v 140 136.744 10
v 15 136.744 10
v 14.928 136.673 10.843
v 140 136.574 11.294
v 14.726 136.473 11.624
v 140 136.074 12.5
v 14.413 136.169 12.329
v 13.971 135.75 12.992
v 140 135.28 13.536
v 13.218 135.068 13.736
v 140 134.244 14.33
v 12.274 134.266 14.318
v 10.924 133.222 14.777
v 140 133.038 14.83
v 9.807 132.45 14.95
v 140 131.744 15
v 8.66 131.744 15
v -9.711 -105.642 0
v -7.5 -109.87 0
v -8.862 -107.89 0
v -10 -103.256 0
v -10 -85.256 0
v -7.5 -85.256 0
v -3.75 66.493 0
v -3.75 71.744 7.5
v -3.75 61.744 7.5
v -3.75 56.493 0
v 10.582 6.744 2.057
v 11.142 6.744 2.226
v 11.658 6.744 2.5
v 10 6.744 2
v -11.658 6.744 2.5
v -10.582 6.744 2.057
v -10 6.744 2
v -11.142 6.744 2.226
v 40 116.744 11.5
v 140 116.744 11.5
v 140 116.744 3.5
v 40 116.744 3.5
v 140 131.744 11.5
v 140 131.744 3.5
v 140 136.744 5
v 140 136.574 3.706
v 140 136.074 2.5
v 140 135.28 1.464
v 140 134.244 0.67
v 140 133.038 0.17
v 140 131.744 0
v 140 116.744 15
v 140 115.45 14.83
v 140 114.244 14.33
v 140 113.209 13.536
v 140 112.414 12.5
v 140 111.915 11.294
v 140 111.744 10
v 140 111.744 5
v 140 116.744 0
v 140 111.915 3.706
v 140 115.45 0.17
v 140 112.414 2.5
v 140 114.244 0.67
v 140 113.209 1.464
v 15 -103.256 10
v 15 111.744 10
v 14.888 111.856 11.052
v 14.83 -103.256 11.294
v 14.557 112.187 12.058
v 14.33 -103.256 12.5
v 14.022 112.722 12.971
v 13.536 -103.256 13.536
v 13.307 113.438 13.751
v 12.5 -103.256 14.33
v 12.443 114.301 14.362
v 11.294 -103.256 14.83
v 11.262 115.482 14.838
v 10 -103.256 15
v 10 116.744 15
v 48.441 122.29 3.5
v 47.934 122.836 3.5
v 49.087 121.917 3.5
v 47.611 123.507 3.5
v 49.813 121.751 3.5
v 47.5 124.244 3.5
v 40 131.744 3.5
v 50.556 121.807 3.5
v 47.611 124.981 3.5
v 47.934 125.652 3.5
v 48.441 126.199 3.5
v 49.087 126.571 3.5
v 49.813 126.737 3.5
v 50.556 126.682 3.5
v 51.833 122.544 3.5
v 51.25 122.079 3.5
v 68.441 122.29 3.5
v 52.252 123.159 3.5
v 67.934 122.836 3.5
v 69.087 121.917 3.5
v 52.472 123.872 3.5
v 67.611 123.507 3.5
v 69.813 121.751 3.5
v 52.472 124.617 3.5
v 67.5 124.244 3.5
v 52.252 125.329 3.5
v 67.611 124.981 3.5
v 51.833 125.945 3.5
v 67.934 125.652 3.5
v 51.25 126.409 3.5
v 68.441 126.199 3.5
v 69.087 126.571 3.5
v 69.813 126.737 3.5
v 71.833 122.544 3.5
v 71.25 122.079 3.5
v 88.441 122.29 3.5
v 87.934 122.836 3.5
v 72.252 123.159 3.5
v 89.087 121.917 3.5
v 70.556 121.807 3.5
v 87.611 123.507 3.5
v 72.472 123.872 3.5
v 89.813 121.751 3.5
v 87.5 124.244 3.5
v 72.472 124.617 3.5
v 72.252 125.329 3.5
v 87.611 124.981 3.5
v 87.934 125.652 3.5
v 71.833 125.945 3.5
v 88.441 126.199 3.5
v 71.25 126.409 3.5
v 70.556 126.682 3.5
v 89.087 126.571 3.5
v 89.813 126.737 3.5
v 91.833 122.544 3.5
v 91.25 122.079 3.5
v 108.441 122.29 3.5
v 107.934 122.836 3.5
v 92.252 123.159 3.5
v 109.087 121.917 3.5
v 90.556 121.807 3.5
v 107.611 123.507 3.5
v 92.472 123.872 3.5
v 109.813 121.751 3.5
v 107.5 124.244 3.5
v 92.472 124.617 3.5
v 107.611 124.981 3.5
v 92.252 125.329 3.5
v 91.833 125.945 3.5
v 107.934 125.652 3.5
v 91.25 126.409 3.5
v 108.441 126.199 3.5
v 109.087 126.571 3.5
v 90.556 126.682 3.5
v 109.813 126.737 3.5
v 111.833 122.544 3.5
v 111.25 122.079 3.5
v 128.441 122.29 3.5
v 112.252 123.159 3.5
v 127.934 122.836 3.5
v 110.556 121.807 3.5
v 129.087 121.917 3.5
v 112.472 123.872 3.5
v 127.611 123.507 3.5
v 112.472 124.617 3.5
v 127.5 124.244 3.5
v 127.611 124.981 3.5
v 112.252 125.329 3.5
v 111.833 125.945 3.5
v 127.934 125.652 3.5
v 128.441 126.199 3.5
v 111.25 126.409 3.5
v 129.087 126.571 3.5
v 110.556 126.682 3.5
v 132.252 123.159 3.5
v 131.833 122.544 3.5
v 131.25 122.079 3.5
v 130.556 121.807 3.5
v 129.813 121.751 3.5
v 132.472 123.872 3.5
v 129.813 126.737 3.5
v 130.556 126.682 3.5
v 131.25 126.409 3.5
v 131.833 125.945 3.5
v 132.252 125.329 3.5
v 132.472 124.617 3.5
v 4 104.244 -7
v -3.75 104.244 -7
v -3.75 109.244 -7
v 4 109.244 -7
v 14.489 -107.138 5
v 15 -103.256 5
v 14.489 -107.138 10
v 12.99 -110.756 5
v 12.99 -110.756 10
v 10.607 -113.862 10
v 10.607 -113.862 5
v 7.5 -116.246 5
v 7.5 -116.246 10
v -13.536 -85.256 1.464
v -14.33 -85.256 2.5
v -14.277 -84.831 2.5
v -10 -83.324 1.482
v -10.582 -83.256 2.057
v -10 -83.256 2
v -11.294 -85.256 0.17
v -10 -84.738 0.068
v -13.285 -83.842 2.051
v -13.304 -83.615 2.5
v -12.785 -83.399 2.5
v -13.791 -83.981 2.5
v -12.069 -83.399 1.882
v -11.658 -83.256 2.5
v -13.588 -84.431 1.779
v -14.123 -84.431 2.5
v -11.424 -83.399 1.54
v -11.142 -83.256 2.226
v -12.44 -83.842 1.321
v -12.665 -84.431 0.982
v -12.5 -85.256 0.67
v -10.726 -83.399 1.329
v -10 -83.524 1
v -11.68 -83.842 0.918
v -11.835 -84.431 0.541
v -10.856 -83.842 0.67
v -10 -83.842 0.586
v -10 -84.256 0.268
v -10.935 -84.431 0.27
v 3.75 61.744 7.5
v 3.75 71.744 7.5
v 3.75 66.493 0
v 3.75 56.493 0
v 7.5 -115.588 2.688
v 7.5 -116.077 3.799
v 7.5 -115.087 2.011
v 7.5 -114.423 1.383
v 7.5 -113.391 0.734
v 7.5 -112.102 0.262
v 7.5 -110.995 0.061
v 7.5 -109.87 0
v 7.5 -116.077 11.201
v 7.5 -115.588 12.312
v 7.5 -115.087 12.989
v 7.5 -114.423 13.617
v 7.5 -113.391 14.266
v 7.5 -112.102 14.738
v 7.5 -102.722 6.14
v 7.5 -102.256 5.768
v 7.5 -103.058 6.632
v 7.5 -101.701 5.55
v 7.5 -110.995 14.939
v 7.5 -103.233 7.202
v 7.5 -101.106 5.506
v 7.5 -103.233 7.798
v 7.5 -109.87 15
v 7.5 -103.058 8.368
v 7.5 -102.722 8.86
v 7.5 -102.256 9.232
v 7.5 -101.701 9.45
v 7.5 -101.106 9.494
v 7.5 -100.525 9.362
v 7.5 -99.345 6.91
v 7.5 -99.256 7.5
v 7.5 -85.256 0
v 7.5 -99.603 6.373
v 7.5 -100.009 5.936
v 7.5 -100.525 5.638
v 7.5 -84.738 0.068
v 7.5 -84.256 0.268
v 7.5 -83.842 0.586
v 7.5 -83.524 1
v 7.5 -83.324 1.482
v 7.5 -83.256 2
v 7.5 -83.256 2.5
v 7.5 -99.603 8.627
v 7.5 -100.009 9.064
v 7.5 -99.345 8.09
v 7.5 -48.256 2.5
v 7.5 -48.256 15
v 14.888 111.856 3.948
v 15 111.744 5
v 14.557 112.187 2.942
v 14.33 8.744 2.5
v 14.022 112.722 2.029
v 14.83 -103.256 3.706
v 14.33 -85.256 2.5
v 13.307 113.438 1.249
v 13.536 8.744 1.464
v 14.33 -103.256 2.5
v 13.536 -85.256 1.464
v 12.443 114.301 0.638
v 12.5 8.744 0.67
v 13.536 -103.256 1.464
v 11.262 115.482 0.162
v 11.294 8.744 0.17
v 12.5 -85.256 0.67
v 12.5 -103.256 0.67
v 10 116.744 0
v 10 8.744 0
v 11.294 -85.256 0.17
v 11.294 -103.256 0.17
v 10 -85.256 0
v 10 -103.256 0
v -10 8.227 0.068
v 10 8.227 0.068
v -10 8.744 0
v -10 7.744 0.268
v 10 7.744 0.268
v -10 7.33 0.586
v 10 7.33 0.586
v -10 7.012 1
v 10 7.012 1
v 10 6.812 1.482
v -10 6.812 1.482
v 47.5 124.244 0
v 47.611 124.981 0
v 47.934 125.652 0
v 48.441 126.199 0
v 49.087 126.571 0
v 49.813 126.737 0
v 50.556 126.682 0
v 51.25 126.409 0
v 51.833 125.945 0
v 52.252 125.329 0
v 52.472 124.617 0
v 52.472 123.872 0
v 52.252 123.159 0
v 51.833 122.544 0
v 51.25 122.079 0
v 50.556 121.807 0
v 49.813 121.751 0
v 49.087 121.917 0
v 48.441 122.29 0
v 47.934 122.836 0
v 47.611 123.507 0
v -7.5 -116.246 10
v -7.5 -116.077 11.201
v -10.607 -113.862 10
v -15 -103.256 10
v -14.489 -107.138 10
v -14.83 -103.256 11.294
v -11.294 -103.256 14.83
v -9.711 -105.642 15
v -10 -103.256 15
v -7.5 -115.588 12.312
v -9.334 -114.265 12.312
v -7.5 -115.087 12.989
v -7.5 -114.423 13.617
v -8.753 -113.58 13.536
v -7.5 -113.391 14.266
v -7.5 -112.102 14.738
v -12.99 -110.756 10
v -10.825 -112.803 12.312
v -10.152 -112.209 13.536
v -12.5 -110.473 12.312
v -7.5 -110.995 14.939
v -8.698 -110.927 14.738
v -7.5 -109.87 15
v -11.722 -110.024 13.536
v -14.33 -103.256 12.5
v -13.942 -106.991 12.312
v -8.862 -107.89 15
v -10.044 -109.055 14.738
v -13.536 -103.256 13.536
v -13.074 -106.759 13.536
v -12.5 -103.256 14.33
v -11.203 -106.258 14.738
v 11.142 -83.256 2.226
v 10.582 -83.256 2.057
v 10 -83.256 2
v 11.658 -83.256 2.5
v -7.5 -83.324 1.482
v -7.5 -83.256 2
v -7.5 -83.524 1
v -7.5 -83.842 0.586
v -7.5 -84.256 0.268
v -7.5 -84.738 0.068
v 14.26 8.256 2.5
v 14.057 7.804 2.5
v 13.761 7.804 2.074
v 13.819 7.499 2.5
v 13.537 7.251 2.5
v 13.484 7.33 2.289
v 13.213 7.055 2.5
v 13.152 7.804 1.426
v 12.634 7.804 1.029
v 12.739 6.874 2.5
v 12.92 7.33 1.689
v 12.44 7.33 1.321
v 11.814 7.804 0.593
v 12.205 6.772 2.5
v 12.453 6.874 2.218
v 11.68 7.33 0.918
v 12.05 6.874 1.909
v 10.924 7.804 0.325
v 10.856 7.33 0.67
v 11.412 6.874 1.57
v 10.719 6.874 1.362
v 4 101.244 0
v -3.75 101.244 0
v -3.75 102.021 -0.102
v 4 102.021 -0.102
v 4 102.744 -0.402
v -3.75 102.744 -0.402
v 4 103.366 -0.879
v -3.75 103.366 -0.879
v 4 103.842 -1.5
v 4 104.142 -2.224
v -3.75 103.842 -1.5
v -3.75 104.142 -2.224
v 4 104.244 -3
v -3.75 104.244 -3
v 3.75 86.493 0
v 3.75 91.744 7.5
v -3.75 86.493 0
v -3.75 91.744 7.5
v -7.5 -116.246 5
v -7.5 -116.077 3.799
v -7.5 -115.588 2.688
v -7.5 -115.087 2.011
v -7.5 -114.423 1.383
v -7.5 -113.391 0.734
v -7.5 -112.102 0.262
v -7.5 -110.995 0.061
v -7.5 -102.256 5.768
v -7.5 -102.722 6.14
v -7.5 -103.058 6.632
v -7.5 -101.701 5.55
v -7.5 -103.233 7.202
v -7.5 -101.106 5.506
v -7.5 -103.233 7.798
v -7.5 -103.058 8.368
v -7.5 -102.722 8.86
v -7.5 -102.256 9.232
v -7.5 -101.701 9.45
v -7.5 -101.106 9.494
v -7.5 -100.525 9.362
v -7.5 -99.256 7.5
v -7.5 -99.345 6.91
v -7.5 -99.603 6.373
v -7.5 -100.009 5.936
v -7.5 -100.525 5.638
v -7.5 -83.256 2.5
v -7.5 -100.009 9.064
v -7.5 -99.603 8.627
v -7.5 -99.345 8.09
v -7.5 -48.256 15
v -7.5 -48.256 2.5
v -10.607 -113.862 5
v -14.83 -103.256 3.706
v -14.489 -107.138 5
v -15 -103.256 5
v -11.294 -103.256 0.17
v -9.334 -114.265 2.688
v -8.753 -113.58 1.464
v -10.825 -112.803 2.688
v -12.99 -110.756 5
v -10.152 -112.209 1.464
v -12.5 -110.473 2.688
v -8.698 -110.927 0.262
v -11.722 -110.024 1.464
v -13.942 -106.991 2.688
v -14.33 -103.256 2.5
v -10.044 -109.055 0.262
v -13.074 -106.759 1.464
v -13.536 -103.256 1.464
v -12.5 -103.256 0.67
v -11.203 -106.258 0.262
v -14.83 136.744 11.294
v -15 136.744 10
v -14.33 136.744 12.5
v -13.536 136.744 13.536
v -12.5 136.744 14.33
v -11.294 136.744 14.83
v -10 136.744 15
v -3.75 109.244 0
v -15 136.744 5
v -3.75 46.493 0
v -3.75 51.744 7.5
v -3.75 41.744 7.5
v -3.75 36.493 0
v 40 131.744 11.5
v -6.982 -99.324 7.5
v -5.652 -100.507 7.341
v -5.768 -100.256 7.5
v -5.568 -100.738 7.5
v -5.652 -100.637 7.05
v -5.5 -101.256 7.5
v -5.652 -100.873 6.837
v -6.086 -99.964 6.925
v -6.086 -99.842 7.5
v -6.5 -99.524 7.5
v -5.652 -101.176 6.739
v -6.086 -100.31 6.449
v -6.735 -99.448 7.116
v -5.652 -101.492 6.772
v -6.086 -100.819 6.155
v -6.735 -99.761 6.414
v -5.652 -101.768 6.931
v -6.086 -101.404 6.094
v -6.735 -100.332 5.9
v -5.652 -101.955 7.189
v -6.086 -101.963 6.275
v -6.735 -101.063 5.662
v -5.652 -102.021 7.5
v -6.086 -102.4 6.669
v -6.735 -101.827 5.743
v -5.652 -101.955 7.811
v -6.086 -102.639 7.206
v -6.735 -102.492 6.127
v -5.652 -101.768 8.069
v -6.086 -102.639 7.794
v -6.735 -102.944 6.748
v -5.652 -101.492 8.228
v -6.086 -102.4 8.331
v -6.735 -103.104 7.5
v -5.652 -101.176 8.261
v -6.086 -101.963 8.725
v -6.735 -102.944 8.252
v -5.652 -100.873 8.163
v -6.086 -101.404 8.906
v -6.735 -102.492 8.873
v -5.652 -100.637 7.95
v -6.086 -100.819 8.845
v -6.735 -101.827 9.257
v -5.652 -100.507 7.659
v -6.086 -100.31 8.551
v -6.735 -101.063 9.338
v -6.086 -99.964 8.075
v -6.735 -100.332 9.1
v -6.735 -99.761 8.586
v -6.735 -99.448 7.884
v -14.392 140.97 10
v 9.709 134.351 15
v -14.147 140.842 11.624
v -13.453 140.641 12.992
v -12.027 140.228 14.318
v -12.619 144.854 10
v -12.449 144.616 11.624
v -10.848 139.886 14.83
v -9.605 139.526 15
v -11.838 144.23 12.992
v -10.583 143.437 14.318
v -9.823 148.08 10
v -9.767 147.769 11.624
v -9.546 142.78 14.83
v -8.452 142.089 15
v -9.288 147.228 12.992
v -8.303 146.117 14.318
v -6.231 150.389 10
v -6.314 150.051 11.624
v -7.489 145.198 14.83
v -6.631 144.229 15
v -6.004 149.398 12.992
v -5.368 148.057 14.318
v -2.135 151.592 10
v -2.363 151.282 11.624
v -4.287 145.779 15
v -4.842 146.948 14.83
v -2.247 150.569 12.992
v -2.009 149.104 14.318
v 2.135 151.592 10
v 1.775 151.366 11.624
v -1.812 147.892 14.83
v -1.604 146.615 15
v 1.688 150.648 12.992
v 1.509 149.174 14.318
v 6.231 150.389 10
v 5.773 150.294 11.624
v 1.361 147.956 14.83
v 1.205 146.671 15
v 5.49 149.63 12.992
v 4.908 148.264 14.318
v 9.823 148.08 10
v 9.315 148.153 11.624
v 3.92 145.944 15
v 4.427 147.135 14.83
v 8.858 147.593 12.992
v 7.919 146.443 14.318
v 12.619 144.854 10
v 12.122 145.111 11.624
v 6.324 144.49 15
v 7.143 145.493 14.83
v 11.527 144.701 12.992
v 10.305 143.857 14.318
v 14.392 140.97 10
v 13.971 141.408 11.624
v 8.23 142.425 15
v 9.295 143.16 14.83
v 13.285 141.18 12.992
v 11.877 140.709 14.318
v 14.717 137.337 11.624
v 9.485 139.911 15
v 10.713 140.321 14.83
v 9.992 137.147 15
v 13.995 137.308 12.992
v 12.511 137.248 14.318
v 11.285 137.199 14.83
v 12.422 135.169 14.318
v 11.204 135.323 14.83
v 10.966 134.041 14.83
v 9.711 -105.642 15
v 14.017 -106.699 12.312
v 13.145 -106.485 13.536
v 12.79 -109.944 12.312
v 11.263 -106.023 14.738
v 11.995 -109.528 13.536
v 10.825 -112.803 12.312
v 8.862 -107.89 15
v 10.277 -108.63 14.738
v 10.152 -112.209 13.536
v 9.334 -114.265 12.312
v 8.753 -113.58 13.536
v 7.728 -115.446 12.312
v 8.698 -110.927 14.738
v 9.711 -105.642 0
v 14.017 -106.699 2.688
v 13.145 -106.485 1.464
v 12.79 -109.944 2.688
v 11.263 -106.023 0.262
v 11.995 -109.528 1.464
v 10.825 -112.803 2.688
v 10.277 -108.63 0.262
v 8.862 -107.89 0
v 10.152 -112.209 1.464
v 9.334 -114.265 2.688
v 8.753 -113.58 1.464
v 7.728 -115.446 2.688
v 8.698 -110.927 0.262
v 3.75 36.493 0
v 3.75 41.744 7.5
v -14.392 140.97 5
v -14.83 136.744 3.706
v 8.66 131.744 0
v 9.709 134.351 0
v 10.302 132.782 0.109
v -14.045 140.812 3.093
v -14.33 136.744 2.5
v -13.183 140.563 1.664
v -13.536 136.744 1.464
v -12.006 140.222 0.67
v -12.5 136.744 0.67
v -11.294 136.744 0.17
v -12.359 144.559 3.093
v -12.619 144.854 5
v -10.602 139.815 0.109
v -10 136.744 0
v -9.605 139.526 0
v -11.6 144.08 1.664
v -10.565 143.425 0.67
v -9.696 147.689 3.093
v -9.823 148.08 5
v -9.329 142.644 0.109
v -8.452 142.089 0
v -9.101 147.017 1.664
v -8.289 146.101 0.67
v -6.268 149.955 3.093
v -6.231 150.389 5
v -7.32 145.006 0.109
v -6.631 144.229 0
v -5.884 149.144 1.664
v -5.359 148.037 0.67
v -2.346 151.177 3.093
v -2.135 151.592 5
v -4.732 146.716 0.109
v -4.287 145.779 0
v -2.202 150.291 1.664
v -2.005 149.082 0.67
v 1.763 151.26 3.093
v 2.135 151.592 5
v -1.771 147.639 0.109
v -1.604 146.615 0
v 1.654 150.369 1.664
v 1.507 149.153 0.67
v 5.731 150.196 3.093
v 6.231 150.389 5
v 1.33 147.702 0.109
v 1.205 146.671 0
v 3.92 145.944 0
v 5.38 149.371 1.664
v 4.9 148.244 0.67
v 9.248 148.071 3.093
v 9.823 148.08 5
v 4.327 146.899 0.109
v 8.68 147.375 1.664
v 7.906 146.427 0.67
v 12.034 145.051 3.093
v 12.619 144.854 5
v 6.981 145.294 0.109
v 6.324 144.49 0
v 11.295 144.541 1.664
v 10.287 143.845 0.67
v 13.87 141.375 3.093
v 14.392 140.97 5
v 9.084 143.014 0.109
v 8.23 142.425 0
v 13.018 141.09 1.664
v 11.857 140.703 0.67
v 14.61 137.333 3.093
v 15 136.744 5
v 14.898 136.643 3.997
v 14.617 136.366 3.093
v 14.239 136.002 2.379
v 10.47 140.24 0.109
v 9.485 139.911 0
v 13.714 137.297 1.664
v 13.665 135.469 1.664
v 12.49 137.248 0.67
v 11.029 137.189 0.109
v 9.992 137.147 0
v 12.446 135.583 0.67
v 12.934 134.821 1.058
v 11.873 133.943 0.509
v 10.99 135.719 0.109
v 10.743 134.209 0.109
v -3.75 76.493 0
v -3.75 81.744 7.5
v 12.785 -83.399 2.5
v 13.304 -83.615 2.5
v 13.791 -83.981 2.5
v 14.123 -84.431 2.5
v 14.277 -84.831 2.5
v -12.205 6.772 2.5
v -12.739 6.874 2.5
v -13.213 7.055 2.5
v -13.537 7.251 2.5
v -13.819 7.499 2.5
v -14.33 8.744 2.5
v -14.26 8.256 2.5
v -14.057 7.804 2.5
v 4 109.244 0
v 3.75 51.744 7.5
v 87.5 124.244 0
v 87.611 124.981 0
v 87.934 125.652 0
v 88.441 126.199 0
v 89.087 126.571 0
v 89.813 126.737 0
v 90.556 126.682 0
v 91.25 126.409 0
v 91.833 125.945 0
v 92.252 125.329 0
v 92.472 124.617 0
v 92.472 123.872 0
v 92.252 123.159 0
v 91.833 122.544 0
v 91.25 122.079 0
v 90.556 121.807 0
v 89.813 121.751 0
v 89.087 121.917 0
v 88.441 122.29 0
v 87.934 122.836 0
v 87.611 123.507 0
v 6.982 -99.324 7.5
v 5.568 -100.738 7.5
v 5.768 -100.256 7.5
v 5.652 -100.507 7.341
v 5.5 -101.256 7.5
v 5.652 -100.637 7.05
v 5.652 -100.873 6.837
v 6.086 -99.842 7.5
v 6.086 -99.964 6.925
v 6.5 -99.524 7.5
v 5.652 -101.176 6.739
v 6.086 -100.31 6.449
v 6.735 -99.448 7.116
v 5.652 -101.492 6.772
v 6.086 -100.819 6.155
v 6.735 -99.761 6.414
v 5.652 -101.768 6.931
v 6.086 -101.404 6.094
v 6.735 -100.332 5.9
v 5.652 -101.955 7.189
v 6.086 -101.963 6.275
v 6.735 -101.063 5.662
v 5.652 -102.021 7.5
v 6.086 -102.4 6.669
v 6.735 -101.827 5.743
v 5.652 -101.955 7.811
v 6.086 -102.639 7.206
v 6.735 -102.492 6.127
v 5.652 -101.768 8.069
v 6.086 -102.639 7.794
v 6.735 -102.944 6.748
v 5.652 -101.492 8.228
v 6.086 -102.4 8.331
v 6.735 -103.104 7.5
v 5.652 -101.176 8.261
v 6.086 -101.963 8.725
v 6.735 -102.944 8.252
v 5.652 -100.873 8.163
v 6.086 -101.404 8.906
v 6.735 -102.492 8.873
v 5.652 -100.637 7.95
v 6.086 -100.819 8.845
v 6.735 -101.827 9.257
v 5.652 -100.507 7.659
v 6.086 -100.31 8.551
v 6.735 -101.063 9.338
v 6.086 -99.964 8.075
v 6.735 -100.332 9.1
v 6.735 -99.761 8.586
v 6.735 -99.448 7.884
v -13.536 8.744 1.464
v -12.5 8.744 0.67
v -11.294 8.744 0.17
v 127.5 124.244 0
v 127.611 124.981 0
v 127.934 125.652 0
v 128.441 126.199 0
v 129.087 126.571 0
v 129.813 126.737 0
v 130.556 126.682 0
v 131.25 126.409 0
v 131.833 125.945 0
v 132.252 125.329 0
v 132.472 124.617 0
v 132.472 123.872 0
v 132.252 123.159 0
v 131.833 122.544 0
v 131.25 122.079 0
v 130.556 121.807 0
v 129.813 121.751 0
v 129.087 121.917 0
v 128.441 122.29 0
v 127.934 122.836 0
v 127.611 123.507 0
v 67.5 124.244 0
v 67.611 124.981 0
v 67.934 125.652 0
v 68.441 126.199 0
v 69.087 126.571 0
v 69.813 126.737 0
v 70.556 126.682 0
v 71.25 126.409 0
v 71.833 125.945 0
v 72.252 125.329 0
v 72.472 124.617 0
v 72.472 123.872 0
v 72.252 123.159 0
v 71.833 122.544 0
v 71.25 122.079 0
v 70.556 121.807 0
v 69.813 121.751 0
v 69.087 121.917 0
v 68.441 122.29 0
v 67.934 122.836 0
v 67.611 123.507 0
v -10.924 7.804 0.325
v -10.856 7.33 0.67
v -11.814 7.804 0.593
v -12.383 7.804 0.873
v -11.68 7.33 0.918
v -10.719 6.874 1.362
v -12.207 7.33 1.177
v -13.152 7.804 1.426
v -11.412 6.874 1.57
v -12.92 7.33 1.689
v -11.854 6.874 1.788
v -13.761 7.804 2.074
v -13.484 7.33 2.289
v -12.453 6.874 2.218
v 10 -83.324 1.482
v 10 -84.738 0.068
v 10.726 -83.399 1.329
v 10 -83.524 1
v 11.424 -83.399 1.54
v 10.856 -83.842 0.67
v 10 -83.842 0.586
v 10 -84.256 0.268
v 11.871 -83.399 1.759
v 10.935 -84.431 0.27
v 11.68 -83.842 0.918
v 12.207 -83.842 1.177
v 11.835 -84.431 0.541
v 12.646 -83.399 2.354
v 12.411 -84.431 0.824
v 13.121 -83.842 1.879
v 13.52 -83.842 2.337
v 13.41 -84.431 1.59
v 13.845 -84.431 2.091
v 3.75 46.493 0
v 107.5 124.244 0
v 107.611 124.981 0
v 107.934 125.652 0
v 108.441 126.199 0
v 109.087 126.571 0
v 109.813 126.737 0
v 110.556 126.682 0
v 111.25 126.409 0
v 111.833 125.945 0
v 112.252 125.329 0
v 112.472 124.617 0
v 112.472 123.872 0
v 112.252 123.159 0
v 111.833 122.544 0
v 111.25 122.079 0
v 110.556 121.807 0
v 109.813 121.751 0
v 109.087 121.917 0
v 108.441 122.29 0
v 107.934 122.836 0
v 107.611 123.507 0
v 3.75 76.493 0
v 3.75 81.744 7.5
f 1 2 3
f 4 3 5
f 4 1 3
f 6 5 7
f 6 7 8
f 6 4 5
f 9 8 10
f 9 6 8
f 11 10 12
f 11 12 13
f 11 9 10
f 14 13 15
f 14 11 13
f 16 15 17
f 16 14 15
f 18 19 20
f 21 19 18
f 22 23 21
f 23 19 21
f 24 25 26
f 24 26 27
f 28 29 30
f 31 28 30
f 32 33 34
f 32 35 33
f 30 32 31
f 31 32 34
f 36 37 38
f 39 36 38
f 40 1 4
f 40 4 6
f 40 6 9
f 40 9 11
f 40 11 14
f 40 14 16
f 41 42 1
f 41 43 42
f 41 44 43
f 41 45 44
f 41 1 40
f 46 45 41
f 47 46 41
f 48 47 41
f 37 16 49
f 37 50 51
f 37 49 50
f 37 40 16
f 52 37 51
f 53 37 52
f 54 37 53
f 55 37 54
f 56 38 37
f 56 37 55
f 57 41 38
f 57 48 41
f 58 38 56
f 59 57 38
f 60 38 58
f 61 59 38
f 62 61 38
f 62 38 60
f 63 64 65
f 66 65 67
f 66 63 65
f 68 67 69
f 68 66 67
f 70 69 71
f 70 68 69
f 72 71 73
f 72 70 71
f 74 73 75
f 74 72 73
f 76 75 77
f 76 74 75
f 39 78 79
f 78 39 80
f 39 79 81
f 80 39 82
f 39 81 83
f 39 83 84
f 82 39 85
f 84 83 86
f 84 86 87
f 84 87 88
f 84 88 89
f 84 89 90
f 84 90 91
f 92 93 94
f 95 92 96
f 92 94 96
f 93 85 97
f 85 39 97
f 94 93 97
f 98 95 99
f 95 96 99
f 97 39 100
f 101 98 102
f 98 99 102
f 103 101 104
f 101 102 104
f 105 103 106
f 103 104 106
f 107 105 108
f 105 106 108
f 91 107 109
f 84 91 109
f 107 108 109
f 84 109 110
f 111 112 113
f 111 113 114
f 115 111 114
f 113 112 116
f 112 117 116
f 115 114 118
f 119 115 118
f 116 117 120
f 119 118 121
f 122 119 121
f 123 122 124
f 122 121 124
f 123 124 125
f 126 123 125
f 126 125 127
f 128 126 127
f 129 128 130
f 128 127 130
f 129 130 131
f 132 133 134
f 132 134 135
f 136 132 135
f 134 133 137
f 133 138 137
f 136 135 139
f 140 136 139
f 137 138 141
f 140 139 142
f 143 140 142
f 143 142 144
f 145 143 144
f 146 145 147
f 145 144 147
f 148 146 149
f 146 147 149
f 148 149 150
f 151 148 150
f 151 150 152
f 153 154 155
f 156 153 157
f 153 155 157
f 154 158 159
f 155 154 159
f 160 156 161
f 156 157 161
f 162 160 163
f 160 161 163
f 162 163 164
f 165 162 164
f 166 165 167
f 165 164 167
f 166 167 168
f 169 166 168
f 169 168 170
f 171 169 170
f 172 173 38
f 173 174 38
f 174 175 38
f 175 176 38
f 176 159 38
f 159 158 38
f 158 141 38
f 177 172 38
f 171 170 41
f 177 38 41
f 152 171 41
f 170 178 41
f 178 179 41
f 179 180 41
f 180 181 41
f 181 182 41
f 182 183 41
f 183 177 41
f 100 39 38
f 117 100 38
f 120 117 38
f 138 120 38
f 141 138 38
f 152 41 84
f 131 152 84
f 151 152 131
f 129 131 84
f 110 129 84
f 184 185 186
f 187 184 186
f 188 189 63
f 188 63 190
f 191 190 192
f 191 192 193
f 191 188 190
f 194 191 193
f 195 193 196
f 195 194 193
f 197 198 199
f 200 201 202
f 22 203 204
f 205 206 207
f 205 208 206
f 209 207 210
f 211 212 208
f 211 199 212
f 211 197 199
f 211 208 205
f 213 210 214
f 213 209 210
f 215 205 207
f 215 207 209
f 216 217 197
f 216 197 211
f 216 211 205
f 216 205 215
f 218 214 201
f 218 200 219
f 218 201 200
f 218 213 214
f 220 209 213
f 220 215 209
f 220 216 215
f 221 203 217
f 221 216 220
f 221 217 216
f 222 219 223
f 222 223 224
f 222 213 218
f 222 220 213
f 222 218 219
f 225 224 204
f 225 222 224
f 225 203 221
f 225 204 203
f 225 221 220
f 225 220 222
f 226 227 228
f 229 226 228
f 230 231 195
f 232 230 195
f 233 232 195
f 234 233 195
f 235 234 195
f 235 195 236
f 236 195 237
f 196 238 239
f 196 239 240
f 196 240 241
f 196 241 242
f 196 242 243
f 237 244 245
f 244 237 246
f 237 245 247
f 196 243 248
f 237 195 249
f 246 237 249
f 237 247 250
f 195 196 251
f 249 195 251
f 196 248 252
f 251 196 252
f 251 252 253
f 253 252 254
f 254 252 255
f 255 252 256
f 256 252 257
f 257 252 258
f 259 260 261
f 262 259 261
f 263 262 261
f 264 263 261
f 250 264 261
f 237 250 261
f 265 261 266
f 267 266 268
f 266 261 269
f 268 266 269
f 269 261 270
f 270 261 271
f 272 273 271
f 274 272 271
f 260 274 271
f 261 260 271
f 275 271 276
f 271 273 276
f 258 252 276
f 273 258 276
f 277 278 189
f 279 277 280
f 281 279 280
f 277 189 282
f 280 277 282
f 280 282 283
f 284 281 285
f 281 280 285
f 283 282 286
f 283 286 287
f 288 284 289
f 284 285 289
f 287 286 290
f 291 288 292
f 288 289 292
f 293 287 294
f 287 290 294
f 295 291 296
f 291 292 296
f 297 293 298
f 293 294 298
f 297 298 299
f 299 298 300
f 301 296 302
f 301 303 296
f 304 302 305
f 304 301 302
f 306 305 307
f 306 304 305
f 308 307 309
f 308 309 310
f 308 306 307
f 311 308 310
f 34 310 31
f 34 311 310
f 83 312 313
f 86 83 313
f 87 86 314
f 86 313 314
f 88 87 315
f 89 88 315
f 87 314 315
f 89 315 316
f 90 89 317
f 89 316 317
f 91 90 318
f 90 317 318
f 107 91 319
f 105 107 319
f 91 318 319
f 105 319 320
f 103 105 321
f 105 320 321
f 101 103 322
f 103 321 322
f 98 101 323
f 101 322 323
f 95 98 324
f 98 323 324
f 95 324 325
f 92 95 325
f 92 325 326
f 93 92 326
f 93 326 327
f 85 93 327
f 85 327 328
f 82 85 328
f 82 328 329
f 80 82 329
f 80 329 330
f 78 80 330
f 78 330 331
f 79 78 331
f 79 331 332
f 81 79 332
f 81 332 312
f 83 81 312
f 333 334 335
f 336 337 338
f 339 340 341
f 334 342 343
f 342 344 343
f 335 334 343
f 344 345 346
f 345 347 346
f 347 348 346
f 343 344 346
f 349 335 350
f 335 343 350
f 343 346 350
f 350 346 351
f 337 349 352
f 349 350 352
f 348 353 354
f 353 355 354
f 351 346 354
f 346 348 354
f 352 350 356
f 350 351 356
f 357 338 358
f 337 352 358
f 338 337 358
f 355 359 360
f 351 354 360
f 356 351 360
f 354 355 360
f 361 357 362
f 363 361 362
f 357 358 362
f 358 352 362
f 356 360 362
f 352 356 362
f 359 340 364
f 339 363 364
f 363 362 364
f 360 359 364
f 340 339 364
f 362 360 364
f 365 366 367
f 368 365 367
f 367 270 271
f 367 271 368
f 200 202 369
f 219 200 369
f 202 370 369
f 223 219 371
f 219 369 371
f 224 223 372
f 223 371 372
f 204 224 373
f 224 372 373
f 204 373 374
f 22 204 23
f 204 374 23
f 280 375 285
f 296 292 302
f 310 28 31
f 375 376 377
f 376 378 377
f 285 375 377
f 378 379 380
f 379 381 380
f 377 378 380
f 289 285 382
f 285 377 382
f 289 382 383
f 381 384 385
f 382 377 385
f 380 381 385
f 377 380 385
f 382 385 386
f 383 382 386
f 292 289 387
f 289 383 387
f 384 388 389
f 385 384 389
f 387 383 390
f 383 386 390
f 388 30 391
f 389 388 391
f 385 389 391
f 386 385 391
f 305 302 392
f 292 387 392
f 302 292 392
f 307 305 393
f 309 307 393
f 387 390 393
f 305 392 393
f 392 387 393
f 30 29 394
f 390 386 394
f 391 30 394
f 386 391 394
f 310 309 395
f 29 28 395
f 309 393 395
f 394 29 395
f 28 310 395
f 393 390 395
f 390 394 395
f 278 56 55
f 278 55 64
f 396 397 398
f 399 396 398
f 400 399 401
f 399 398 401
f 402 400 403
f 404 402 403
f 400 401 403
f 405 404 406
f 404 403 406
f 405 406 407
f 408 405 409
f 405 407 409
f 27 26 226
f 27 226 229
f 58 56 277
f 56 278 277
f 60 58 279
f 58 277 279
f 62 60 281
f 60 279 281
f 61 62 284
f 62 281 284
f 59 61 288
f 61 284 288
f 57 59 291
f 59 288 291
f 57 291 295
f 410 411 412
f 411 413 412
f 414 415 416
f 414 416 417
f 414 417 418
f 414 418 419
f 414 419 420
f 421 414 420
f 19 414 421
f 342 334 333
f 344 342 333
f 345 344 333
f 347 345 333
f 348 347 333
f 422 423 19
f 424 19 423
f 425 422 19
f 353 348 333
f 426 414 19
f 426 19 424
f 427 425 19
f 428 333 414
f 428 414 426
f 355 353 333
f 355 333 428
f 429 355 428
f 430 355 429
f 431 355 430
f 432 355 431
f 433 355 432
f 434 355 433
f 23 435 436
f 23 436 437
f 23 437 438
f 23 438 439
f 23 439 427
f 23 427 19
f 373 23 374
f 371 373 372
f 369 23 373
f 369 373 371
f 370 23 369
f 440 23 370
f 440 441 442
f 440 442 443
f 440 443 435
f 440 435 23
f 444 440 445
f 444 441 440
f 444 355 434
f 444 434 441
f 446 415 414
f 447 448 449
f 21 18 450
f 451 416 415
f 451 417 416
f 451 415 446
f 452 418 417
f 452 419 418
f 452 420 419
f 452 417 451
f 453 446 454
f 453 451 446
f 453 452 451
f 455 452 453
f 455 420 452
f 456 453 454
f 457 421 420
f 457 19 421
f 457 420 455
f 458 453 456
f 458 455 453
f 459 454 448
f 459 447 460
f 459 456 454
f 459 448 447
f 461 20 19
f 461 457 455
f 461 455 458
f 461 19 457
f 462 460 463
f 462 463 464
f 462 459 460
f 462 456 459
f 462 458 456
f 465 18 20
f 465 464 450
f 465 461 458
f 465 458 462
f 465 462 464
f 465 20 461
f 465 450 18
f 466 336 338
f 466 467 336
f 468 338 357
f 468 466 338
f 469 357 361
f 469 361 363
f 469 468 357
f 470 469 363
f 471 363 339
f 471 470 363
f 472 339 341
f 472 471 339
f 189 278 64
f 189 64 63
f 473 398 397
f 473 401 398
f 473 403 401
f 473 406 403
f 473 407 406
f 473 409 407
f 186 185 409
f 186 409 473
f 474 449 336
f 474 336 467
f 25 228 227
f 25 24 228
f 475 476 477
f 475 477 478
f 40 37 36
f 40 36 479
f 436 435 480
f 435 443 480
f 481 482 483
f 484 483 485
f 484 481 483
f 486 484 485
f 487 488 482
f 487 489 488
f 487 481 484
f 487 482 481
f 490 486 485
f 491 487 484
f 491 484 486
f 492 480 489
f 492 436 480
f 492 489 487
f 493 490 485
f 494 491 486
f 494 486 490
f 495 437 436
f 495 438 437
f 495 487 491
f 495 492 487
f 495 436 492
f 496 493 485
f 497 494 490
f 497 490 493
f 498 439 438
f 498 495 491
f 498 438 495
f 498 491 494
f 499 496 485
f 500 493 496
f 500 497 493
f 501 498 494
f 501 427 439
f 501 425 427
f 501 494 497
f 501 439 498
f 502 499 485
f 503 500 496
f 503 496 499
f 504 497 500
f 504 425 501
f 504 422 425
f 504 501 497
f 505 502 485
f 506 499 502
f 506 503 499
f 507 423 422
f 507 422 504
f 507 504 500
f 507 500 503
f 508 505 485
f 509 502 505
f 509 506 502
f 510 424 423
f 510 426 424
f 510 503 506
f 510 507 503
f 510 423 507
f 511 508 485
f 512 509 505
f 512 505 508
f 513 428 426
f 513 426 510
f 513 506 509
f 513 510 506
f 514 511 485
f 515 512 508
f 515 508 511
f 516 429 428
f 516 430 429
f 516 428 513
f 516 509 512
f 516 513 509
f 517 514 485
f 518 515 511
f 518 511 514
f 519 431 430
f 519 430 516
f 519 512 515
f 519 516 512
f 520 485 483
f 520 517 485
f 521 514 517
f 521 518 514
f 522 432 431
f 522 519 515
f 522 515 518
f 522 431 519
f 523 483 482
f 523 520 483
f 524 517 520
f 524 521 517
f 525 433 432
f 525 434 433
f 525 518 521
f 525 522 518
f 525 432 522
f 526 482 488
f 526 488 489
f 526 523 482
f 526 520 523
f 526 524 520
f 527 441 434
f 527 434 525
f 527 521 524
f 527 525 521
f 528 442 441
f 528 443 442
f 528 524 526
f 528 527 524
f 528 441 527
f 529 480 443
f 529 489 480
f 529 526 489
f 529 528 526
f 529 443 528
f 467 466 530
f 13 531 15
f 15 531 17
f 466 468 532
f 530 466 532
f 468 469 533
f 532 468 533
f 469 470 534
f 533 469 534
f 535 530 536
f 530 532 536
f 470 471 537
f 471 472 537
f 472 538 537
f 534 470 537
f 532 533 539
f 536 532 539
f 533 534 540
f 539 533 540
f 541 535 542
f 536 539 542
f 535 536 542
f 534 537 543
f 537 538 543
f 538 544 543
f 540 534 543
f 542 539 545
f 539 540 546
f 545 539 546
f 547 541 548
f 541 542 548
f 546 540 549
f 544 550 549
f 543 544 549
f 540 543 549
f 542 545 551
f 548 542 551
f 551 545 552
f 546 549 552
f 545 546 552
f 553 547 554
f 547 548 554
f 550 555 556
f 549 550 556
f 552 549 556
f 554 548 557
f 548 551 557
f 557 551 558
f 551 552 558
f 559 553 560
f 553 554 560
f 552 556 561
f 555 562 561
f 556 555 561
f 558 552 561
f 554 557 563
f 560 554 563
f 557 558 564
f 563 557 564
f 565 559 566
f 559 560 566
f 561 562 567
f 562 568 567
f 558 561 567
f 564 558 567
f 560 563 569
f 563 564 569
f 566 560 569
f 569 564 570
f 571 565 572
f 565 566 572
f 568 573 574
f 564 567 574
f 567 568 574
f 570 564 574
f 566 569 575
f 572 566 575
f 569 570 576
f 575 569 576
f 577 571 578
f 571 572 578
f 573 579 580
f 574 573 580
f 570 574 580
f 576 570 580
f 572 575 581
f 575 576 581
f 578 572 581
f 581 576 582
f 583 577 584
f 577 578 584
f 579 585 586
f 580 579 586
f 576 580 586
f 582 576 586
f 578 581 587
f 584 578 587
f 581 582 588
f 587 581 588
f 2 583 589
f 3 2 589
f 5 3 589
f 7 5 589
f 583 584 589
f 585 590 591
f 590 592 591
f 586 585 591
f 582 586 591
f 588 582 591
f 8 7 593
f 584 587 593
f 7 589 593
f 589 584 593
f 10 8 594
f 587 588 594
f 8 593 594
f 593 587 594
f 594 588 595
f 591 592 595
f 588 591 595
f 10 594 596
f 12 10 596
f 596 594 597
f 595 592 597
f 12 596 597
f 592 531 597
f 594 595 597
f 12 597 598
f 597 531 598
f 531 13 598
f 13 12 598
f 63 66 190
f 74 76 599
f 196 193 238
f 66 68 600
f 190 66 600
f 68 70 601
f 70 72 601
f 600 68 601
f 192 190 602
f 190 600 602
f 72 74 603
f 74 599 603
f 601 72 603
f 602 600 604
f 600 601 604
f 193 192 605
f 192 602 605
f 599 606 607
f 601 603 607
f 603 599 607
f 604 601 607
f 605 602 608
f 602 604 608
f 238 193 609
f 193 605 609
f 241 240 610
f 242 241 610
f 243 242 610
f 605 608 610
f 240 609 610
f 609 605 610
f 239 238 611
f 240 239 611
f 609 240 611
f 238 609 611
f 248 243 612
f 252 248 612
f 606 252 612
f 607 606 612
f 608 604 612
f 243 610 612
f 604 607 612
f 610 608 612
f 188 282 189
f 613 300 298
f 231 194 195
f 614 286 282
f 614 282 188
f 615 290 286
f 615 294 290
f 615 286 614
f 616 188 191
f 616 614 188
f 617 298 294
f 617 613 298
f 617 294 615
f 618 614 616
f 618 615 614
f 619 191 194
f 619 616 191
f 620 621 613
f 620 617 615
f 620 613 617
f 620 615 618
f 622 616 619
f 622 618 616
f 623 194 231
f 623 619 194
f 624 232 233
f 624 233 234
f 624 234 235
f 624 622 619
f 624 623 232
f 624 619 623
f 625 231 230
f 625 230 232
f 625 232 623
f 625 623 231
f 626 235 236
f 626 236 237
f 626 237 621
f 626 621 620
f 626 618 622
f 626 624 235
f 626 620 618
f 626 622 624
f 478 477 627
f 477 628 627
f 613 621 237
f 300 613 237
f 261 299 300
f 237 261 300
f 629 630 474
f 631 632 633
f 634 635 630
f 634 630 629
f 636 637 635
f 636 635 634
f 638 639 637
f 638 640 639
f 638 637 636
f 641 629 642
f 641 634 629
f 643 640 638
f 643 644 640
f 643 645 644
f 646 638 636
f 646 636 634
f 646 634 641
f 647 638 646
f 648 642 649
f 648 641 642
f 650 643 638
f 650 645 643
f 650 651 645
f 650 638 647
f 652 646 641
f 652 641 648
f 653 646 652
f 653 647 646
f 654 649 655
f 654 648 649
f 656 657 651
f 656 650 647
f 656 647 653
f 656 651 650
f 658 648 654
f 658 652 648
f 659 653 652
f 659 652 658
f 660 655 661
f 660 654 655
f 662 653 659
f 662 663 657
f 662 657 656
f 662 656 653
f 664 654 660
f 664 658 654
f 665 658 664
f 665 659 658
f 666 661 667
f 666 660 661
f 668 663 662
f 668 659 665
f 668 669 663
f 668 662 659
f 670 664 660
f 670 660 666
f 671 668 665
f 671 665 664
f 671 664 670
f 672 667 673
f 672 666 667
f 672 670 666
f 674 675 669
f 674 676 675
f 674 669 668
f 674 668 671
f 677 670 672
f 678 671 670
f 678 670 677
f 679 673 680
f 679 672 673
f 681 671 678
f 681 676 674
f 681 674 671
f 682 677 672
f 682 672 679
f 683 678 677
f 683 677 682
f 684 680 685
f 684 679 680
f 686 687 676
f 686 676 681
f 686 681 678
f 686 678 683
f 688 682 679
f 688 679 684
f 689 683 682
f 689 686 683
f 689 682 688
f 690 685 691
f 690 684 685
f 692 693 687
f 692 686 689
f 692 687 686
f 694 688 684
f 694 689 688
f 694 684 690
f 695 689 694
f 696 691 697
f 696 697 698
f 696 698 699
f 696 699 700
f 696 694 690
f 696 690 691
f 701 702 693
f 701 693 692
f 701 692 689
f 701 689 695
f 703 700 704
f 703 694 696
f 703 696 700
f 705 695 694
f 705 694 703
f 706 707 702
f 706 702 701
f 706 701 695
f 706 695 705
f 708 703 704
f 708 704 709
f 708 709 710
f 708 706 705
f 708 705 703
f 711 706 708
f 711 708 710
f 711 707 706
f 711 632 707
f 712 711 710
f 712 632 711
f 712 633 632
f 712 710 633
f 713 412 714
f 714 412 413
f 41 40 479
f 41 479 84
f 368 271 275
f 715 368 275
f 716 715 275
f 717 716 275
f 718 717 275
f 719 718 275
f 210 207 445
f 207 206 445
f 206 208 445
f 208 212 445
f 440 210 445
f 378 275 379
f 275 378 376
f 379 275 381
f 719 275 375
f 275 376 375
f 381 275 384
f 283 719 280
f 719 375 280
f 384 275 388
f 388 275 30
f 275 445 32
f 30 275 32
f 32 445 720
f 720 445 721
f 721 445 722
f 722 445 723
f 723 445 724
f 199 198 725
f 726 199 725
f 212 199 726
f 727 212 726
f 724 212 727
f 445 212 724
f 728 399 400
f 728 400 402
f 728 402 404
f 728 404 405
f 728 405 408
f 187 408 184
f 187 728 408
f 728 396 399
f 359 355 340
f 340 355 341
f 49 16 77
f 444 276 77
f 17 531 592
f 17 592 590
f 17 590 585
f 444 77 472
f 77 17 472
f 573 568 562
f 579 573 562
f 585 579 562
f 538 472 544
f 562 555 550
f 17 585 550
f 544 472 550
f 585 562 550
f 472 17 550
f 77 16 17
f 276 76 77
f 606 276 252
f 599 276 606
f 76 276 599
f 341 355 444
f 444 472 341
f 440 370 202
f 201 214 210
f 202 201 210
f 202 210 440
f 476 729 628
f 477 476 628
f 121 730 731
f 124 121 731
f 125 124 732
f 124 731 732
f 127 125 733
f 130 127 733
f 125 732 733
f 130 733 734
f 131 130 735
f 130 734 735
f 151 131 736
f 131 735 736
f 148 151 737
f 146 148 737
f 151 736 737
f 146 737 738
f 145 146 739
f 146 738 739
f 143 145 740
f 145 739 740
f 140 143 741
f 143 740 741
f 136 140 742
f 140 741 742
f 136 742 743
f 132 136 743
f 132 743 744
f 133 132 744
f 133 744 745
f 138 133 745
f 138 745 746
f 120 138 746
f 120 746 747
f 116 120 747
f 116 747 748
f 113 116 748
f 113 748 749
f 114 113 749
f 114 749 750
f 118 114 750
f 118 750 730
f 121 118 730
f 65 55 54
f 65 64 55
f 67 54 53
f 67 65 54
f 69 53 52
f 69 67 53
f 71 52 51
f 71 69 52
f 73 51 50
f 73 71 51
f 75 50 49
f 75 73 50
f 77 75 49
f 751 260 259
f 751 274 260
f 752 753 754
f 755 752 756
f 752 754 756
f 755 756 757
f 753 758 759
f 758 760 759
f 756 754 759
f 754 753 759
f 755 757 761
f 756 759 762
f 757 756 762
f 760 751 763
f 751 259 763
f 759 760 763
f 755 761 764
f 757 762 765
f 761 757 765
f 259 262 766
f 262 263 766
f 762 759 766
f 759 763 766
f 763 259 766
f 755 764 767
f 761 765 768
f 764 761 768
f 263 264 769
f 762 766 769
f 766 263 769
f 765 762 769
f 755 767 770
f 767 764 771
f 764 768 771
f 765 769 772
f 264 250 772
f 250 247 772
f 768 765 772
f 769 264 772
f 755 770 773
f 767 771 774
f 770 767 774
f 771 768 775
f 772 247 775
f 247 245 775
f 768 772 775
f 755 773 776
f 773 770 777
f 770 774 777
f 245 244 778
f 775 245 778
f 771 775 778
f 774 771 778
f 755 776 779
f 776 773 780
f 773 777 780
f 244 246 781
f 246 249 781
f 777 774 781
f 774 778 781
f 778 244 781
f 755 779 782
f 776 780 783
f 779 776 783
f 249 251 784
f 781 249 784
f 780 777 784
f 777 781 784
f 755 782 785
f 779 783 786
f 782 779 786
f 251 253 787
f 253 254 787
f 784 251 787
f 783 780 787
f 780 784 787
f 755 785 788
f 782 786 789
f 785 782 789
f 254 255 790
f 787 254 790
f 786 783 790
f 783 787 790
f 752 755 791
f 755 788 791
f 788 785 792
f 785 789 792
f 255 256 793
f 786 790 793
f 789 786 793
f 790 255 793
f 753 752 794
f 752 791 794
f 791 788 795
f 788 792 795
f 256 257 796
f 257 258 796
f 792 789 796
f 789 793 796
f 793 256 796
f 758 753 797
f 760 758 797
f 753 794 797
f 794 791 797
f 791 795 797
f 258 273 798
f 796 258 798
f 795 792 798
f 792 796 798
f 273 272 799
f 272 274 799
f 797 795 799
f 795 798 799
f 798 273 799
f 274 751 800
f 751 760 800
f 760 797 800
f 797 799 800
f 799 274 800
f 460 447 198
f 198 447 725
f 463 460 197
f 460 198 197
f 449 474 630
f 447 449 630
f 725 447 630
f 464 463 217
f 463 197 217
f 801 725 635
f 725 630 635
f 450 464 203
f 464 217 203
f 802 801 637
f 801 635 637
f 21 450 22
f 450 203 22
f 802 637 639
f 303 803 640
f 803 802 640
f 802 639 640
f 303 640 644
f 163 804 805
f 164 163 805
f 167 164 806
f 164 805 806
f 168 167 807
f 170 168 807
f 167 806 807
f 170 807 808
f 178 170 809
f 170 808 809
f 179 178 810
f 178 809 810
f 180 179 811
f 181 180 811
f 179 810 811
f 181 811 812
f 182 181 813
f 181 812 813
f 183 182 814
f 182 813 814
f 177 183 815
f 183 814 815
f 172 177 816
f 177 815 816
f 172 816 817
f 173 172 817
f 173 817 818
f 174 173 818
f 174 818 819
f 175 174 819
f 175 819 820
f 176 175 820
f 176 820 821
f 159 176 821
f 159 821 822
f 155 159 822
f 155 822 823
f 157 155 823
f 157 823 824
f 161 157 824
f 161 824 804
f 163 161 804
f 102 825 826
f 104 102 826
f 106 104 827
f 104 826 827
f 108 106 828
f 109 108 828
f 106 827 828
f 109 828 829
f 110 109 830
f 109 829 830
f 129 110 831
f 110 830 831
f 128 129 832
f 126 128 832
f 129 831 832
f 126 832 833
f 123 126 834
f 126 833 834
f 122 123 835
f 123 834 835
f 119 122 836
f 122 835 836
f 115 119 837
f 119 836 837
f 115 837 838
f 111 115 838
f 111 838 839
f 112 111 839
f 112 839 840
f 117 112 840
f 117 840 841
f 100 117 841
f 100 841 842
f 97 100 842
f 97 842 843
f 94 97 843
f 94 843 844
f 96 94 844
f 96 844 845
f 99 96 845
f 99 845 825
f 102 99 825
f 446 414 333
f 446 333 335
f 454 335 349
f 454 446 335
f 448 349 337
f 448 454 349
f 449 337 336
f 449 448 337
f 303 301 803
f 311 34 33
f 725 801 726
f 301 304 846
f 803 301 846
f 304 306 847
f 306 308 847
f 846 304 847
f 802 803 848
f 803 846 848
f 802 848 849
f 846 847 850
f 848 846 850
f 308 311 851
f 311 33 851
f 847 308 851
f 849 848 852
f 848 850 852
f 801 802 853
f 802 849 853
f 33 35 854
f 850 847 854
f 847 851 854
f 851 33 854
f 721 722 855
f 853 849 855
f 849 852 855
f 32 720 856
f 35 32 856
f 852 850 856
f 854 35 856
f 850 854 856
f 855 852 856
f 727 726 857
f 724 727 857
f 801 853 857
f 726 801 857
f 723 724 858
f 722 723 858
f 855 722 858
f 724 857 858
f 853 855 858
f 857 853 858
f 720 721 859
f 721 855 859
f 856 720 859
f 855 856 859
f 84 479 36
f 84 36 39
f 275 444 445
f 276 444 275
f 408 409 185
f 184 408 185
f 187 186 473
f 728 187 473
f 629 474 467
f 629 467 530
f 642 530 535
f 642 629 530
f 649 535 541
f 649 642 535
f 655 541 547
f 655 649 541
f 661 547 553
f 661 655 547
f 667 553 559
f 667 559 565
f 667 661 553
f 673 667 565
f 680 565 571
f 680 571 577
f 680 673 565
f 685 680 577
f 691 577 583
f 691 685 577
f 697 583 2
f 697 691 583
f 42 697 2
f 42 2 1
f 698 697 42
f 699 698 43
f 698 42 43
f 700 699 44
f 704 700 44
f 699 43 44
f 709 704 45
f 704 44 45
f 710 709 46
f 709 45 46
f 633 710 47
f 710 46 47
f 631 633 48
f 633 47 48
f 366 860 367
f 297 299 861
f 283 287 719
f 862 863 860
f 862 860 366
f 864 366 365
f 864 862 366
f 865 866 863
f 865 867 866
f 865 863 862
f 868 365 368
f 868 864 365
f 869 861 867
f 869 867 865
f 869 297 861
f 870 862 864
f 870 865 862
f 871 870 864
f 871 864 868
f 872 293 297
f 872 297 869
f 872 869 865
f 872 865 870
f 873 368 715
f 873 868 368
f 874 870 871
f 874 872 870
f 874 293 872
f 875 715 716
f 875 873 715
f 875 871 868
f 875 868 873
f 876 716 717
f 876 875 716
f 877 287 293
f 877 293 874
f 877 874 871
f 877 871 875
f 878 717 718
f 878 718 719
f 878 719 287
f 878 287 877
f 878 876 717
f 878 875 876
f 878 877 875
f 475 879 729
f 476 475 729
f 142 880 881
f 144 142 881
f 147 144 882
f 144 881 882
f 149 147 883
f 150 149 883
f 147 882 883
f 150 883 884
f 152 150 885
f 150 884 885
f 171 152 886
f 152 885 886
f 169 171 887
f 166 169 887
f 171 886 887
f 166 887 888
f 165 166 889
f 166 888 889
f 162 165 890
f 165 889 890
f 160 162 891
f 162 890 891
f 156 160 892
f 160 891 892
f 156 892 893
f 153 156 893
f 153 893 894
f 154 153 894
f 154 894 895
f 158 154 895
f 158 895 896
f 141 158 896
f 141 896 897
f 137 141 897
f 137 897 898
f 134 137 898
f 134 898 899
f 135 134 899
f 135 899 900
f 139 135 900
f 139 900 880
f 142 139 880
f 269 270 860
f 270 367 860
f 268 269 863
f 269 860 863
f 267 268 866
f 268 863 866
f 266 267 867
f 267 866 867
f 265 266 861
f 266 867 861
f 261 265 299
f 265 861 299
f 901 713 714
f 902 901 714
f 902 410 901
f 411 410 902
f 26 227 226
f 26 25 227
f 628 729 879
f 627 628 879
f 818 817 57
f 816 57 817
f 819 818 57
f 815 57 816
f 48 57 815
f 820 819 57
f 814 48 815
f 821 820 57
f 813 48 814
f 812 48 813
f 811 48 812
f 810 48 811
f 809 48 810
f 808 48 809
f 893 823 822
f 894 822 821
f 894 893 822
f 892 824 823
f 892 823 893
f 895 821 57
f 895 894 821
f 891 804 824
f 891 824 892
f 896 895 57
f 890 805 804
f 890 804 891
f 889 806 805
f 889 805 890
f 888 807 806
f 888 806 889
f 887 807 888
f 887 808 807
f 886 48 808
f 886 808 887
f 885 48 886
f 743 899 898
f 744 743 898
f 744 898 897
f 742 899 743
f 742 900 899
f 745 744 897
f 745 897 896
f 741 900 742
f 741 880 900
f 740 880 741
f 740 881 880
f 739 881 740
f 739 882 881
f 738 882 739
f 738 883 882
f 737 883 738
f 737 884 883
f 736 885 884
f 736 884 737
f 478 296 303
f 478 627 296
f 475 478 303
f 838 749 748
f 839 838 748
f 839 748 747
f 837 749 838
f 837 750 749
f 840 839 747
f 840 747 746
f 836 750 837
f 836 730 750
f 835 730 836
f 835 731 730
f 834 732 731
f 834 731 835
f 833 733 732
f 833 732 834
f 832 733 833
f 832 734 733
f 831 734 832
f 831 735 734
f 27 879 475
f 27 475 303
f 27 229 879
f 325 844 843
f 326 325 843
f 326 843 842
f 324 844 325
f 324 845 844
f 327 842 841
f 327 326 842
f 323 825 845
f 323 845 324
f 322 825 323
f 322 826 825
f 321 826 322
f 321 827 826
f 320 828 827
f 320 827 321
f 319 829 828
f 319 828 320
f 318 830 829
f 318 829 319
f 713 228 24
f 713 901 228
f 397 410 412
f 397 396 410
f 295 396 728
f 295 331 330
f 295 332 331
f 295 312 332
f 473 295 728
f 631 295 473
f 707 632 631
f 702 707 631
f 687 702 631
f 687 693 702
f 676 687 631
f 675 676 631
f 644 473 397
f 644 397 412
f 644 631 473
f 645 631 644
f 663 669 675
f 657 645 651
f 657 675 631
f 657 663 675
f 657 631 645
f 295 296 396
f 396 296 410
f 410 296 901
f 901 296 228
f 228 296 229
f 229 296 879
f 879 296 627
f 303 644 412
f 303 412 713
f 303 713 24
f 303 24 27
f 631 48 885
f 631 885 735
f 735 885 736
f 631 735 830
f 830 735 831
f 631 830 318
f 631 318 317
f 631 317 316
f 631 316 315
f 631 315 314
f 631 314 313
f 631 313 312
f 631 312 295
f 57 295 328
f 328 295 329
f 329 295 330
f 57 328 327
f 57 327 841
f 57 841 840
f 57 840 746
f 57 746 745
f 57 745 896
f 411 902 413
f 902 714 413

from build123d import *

# Parameters (mm, degrees)
BOSS_EXTRUDE1_DEPTH = 15
FILLET1_R           = 5
SKETCH2_W           = 8
SKETCH2_H           = 15
CUT_EXTRUDE1_DEPTH  = 100
SKETCH3_W           = 15
SKETCH3_H           = 70
CUT_EXTRUDE3_DEPTH  = 100
CUT_EXTRUDE4_DEPTH  = 3.75
SKETCH9_R           = 2.5
CUT_EXTRUDE5_DEPTH  = 7.5
SKETCH10_W          = 2.5
SKETCH10_H          = 90
CUT_EXTRUDE6_DEPTH  = 218.431134071
FILLET2_R           = 2
BOSS_EXTRUDE2_DEPTH = 19
SKETCH12_W          = 13.011456799
SKETCH12_H          = 10.932703346
CUT_EXTRUDE7_DEPTH  = 7


with BuildPart() as part:
    # Sketch1 → Boss-Extrude1 (new body)
    with BuildSketch(Plane.XY):
        with BuildLine():
            Line((-15, -103.255813953), (-15, 136.744186047))
            ThreePointArc((-15, 136.744186047), (0, 151.744186047), (15, 136.744186047))
            Line((15, 136.744186047), (140, 136.744186047))
            Line((140, 136.744186047), (140, 111.744186047))
            Line((140, 111.744186047), (15, 111.744186047))
            Line((15, 111.744186047), (15, -103.255813953))
            ThreePointArc((15, -103.255813953), (0, -118.255813953), (-15, -103.255813953))
        make_face()
    extrude(amount=BOSS_EXTRUDE1_DEPTH)

    # Fillet1
    fillet1_edges = [part.edges().sort_by_distance(p)[0] for p in [
        (0, -118.255813953, 0),
        (77.5, 111.744186047, 15),
        (77.5, 136.744186047, 15),
        (0, 151.744186047, 15),
        (-15, 16.744186047, 15),
        (0, -118.255813953, 15),
        (-15, 16.744186047, 0),
        (0, 151.744186047, 0),
        (77.5, 136.744186047, 0),
        (15, 4.244186047, 15),
        (77.5, 111.744186047, 0),
        (15, 4.244186047, 0),
    ]]
    fillet(fillet1_edges, radius=FILLET1_R)

    # Sketch2 → Cut-Extrude1 (cut)
    with BuildSketch(Plane(origin=(140, 0, 0), x_dir=(0, 0, -1), z_dir=(1, 0, 0))):
        with Locations((-7.5, 124.244186047)):
            Rectangle(SKETCH2_W, SKETCH2_H)
    extrude(amount=-CUT_EXTRUDE1_DEPTH, mode=Mode.SUBTRACT)

    # Sketch3 → Cut-Extrude3 (cut)
    with BuildSketch(Plane.XY.offset(15)):
        with Locations((0, -83.255813953)):
            Rectangle(SKETCH3_W, SKETCH3_H)
    extrude(amount=-CUT_EXTRUDE3_DEPTH, mode=Mode.SUBTRACT)

    # Sketch6 → Revolve1 (revolve)
    with BuildSketch(Plane.XY.offset(7.5)):
        with BuildLine():
            Line((-7.5, -101.255813953), (-5.5, -101.255813953))
            ThreePointArc((-5.5, -101.255813953), (-6.085786438, -99.841600391), (-7.5, -99.255813953))
            Line((-7.5, -99.255813953), (-7.5, -101.255813953))
        make_face()
        with BuildLine():
            Line((7.5, -101.255813953), (5.5, -101.255813953))
            ThreePointArc((5.5, -101.255813953), (6.085786438, -99.841600391), (7.5, -99.255813953))
            Line((7.5, -99.255813953), (7.5, -101.255813953))
        make_face()
    revolve(axis=Axis((22.79505848, -101.255813953, 7.5), (-1, 0, 0)))

    # Sketch8 → Cut-Extrude4 (cut, symmetric)
    with BuildSketch(Plane(origin=(0, 0, 0), x_dir=(0, 0, -1), z_dir=(1, 0, 0))):
        Polygon((-7.5, 91.744186047), (0, 86.49262951), (0, 76.49262951), (-7.5, 81.744186047), align=None)
        Polygon((0, 56.49262951), (0, 66.49262951), (-7.5, 71.744186047), (-7.5, 61.744186047), align=None)
        Polygon((0, 36.49262951), (0, 46.49262951), (-7.5, 51.744186047), (-7.5, 41.744186047), align=None)
    extrude(amount=CUT_EXTRUDE4_DEPTH, both=True, mode=Mode.SUBTRACT)

    # Sketch9 → Cut-Extrude5 (cut)
    with BuildSketch(Plane(origin=(0, 0, 0), x_dir=(-1, 0, 0), z_dir=(0, 0, -1))):
        with Locations((-130, 124.244186047)):
            Circle(SKETCH9_R)
        with Locations((-110, 124.244186047)):
            Circle(SKETCH9_R)
        with Locations((-90, 124.244186047)):
            Circle(SKETCH9_R)
        with Locations((-70, 124.244186047)):
            Circle(SKETCH9_R)
        with Locations((-50, 124.244186047)):
            Circle(SKETCH9_R)
    extrude(amount=-CUT_EXTRUDE5_DEPTH, mode=Mode.SUBTRACT)

    # Sketch10 → Cut-Extrude6 (cut, through all)
    with BuildSketch(Plane.ZY.offset(15)):
        with Locations((1.25, -38.255813953)):
            Rectangle(SKETCH10_W, SKETCH10_H)
    extrude(amount=-CUT_EXTRUDE6_DEPTH, mode=Mode.SUBTRACT)

    # Fillet2
    fillet2_edges = [part.edges().sort_by_distance(p)[0] for p in [
        (-12.5, 6.744186047, 0.669872981),
        (12.5, 6.744186047, 0.669872981),
        (8.75, -83.255813953, 0),
        (-8.75, -83.255813953, 0),
        (12.5, -83.255813953, 0.669872981),
        (-12.5, -83.255813953, 0.669872981),
        (0, 6.744186047, 0),
    ]]
    fillet(fillet2_edges, radius=FILLET2_R)

    # Sketch11 → Boss-Extrude2 (add)
    with BuildSketch(Plane.ZY.offset(15)):
        with BuildLine():
            Line((0, 109.244186047), (0, 101.244186047))
            ThreePointArc((0, 101.244186047), (-0.878679656, 103.36550639), (-3, 104.244186047))
            Line((-3, 104.244186047), (-7, 104.244186047))
            Line((-7, 104.244186047), (-7, 109.244186047))
            Line((-7, 109.244186047), (0, 109.244186047))
        make_face()
    extrude(amount=-BOSS_EXTRUDE2_DEPTH)

    # Sketch12 → Cut-Extrude7 (cut)
    with BuildSketch(Plane(origin=(0, 0, -7), x_dir=(-1, 0, 0), z_dir=(0, 0, -1))):
        with Locations((10.2557284, 106.179286635)):
            Rectangle(SKETCH12_W, SKETCH12_H)
    extrude(amount=-CUT_EXTRUDE7_DEPTH, mode=Mode.SUBTRACT)


solid = part.part
